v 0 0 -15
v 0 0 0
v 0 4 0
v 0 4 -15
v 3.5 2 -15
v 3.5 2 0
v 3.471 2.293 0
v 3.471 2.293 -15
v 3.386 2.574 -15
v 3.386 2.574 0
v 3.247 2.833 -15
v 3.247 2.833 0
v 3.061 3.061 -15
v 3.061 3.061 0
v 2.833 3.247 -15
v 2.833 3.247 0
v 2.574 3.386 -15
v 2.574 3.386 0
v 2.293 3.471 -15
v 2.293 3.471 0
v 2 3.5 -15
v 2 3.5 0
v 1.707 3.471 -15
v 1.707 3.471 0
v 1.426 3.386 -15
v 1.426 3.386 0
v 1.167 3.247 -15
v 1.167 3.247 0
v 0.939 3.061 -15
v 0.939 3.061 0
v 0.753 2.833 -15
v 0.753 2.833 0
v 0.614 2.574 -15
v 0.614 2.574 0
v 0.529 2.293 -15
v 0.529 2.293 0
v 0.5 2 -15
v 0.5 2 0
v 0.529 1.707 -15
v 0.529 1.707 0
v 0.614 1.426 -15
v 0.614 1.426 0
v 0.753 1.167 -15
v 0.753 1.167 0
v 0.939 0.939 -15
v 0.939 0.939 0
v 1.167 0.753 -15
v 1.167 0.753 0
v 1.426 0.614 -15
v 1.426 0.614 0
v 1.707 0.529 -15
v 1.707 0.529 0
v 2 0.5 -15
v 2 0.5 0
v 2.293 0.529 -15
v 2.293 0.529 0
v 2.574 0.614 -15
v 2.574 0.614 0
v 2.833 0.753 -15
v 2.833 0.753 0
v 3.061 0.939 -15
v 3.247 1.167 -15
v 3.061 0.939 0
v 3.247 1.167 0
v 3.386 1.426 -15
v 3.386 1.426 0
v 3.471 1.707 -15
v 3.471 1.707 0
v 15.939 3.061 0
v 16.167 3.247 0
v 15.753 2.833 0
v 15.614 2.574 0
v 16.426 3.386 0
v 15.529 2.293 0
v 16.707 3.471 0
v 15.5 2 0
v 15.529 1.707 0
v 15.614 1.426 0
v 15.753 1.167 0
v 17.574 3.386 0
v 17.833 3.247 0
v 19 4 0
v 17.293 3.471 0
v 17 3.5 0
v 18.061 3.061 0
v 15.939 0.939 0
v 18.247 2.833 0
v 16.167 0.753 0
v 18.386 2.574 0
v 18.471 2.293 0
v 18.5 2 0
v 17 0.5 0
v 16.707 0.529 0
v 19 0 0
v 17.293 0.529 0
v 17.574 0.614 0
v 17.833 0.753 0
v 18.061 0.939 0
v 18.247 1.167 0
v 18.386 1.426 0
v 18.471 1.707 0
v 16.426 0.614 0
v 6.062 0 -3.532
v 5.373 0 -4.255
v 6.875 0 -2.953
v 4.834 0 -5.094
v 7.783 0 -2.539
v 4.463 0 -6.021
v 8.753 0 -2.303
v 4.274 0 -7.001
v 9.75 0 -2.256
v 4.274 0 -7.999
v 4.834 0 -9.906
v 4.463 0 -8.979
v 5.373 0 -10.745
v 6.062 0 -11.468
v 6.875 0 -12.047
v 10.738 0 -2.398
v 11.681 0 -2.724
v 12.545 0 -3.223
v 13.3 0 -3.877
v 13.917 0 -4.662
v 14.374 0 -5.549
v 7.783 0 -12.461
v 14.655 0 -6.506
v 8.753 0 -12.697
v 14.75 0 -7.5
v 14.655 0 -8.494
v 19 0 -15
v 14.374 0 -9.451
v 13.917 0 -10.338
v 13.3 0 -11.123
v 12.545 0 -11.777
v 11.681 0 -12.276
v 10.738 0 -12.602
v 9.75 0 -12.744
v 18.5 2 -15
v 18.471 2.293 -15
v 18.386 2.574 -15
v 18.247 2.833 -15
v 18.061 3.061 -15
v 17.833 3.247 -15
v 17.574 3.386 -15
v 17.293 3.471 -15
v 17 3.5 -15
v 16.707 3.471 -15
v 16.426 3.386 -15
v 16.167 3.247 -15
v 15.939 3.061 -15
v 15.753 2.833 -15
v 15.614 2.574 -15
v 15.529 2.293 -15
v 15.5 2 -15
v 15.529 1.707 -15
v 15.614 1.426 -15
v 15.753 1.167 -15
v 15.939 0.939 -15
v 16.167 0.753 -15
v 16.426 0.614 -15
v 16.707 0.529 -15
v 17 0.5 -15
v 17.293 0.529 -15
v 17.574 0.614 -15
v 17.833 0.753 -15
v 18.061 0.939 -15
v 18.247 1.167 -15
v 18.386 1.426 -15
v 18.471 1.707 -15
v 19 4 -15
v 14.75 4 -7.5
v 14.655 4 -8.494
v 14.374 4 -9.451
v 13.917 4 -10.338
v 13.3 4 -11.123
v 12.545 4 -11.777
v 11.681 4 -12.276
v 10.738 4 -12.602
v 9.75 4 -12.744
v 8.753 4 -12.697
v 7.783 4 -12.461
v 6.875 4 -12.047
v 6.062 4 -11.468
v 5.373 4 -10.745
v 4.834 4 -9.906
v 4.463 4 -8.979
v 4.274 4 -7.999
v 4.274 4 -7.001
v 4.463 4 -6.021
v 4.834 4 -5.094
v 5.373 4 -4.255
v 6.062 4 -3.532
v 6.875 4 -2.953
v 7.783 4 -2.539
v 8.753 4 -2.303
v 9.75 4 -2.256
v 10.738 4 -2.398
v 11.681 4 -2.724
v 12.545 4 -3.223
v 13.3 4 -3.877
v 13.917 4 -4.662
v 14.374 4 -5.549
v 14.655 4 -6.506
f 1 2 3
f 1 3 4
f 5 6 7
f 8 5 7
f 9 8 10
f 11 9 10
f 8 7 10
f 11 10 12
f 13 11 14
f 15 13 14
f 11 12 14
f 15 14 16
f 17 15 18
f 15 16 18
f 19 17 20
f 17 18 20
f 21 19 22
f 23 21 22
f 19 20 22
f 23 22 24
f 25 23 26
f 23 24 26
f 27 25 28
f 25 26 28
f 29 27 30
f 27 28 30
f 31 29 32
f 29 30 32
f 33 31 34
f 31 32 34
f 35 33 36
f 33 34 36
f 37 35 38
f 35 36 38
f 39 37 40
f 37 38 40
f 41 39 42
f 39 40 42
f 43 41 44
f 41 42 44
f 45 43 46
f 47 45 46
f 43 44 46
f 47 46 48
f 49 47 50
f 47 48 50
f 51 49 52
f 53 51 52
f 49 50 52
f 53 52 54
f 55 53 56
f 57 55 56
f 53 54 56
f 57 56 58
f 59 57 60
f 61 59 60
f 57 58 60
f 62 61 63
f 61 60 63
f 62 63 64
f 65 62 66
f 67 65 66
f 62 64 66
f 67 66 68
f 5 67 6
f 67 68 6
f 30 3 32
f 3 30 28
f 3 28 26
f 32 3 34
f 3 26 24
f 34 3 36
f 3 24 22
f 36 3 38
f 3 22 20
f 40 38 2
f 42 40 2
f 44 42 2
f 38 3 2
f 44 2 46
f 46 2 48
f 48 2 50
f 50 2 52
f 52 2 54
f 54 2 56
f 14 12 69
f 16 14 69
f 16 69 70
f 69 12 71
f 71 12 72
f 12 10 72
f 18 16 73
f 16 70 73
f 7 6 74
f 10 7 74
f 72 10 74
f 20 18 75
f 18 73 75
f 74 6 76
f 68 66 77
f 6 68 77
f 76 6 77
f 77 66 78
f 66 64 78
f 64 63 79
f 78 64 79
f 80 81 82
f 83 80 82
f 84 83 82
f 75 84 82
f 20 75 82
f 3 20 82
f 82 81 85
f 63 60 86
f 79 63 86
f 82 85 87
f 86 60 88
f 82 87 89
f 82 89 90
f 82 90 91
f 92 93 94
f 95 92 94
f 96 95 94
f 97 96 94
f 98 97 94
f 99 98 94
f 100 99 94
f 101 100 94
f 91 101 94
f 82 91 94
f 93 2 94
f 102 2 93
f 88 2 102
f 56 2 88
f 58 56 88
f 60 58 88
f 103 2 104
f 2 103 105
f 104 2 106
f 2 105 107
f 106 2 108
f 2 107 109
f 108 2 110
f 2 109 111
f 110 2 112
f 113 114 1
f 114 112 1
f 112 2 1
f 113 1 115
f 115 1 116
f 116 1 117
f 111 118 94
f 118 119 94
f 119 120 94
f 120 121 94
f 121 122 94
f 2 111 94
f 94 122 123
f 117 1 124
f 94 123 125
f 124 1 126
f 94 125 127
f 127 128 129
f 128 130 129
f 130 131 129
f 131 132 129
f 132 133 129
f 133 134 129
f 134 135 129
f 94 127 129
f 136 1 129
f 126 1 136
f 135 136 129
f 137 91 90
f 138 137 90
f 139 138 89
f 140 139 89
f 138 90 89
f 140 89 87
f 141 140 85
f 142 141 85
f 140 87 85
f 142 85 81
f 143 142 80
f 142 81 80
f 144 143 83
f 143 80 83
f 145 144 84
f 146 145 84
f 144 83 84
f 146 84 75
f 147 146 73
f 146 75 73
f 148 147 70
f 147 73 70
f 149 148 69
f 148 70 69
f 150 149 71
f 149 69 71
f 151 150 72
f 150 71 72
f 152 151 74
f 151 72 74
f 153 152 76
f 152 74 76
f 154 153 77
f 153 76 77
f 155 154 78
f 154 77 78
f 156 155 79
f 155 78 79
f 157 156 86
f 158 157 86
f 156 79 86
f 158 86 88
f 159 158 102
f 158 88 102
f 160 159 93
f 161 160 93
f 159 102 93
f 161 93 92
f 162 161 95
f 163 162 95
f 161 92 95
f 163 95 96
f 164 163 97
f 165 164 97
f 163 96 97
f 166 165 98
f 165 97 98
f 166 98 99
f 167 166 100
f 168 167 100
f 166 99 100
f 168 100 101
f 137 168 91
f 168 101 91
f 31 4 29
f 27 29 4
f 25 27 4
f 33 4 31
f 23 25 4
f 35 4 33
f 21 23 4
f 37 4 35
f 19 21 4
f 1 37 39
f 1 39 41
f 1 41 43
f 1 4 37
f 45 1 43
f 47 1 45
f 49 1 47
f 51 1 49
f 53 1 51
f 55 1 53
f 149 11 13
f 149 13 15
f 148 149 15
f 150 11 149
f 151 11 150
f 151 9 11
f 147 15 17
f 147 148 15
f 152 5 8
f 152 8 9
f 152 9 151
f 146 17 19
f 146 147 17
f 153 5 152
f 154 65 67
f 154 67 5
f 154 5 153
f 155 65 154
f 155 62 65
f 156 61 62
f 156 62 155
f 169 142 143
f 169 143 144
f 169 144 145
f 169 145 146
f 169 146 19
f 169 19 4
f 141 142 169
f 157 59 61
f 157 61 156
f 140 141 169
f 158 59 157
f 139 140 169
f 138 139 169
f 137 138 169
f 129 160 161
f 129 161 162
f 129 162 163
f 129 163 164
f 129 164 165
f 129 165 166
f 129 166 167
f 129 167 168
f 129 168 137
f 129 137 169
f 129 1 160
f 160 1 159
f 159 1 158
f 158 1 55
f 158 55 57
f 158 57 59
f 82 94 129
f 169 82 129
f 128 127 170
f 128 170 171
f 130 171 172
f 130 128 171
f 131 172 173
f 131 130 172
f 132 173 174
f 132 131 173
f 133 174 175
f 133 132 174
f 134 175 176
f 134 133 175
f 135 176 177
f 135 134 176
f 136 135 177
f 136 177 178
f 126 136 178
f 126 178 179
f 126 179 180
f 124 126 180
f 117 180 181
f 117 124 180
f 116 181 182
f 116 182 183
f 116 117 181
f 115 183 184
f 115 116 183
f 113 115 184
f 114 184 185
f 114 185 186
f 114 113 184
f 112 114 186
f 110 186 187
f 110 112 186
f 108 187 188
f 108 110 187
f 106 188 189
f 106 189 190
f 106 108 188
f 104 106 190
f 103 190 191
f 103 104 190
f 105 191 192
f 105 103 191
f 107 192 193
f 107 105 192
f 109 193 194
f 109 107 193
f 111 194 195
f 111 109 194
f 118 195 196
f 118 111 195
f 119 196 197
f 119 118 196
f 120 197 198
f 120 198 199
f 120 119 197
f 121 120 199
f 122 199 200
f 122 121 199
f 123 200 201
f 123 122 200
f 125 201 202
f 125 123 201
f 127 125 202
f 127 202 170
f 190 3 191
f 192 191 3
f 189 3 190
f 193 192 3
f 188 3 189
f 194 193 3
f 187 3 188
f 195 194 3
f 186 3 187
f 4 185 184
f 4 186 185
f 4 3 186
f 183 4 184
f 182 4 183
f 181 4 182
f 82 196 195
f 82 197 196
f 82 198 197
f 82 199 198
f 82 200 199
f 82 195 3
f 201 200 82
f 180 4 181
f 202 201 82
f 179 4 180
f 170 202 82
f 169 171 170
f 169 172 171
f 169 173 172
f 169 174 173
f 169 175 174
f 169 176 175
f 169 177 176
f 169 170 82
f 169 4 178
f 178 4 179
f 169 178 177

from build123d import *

# Parameters (mm, degrees)
SKETCH1_W           = 19
SKETCH1_H           = 15
SKETCH1_R           = 5.25
BOSS_EXTRUDE1_DEPTH = 4
SKETCH2_R           = 1.5
CUT_EXTRUDE1_DEPTH  = 15


with BuildPart() as part:
    # Sketch1 → Boss-Extrude1 (new body)
    with BuildSketch(Plane(origin=(0, 0, 0), x_dir=(1, 0, 0), z_dir=(0, 1, 0))):
        with Locations((9.5, 7.5)):
            Rectangle(SKETCH1_W, SKETCH1_H)
        with Locations((9.5, 7.5)):
            Circle(SKETCH1_R, mode=Mode.SUBTRACT)
    extrude(amount=BOSS_EXTRUDE1_DEPTH)

    # Sketch2 → Cut-Extrude1 (cut)
    with BuildSketch(Plane.XY):
        with Locations((2, 2)):
            Circle(SKETCH2_R)
        with Locations((17, 2)):
            Circle(SKETCH2_R)
    extrude(amount=-CUT_EXTRUDE1_DEPTH, mode=Mode.SUBTRACT)


solid = part.part
